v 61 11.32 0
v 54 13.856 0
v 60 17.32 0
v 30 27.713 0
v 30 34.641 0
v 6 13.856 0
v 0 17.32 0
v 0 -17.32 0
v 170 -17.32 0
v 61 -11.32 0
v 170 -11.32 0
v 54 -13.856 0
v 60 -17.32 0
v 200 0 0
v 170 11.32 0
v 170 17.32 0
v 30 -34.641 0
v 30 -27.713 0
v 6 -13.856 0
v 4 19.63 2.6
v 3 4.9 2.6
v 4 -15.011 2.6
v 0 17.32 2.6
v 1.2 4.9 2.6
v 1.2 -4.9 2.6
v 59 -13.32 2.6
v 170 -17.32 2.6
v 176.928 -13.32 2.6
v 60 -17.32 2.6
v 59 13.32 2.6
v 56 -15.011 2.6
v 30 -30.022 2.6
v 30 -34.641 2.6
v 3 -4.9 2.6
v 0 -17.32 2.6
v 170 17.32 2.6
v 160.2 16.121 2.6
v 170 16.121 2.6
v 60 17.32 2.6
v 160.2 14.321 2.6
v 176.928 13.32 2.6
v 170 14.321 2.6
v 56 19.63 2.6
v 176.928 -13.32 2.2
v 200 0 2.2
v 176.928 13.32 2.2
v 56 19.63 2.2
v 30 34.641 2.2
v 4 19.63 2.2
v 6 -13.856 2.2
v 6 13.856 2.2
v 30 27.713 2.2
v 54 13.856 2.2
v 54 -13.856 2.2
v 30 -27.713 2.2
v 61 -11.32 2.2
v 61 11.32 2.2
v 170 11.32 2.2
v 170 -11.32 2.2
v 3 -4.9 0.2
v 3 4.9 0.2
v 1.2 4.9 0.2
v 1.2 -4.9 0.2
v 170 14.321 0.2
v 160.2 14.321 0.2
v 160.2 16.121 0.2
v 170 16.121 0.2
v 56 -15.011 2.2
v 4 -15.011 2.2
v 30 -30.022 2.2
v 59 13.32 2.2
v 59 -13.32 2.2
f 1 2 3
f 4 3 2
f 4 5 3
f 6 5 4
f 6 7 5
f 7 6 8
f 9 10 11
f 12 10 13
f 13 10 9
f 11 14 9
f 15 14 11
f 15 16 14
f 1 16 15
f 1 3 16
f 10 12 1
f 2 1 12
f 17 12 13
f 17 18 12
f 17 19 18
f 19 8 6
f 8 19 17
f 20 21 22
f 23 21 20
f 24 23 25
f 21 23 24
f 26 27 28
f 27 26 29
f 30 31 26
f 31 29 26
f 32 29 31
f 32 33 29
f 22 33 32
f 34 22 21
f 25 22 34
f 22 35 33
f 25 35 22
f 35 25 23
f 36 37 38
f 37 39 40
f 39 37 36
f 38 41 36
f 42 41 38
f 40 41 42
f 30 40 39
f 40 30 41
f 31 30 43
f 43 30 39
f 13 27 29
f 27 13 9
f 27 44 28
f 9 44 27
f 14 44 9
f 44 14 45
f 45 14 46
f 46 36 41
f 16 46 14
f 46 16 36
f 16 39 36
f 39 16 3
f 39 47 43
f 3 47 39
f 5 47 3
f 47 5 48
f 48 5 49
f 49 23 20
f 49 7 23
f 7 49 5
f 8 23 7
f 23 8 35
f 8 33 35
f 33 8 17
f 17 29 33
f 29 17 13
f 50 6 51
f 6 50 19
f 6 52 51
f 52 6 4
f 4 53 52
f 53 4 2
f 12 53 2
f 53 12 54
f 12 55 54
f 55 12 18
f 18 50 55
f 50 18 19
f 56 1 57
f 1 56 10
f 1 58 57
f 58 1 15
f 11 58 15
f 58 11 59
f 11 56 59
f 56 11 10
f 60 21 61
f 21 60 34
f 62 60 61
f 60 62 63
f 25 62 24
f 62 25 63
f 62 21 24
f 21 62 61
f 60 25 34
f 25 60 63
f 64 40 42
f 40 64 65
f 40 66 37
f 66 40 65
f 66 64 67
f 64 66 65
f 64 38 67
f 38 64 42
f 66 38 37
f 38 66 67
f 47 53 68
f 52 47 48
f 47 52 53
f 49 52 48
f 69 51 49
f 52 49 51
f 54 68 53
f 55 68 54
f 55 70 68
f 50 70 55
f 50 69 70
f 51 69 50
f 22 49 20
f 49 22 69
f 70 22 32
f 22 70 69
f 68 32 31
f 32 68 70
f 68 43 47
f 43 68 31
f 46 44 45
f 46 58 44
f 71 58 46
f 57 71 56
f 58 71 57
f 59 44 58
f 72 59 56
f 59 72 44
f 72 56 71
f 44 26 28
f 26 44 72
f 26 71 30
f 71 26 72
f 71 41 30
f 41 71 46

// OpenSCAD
hexdia = 60;
hexside = 6;
labelw = 110;
labelside = 1;

hexin = 2;

thick = 5.2;
slit = 0.8;

magnetsize = [1.8, 9.8, 4.8];

magnetoff = magnetsize.x/2+1.2;

translate([hexdia/2, 0, 0]) {
    hexlabel();

    *translate([-(hexdia/2-magnetoff), 0, thick/2]) magnet();
    //*translate([ (hexdia/2-magnetoff), 0, thick/2]) magnet();
    *translate([ (hexdia/2+labelw+hexside-magnetoff), 0, thick/2]) magnet();
}

module hexlabel()
{
    hxr = hexdia/sqrt(3);
    hxir = (hexdia-hexside*2)/sqrt(3);
    hin = hexside-hexin;
    hxsr = (hexdia-hin*2)/sqrt(3);
    difference() {
        linear_extrude(height=thick/2, convexity=5) difference() {
            polygon(points=concat(
                [for (an=[30:60:360-30]) [cos(an)*hxr, sin(an)*hxr]],
                [[cos(360-30)*hxr+labelw, sin(360-30)*hxr]
                ,[hexdia+labelw, 0]
                ,[cos(30)*hxr+labelw, sin(30)*hxr]],
                [for (an=[30:60:360-30]) [cos(an)*hxir, sin(an)*hxir]],
                [[cos(360-30)*hxr+labelside, sin(360-30)*hxr+hexside]
                ,[cos(360-30)*hxr+labelw, sin(360-30)*hxr+hexside]
                ,[cos(30)*hxr+labelw, sin(30)*hxr-hexside]
                ,[cos(30)*hxr+labelside, sin(30)*hxr-hexside]]
            ), paths=[
                range(0,9),
                range(9,6),
                range(15,4)]);
        }
        translate([-(hexdia/2-magnetoff), 0, thick/2]) magnethole();
        //translate([ (hexdia/2-magnetoff), 0, thick/2]) magnethole();
        //translate([ (hexdia/2+labelw+hexside-magnetoff), 0, thick/2]) magnethole();
        translate([ (hexdia/2+labelw-magnetsize.y/2), sin(30)*hxr-magnetoff, thick/2])
            rotate([0,0,90]) magnethole();
        translate([0, 0, thick/2-slit/2]) linear_extrude(height=slit/2+0.01, convexity=5)
            polygon(concat(
                [for (an=[30:60:150]) [cos(an)*hxsr, sin(an)*hxsr+2*hin]],
                [for (an=[210:60:360-30]) [cos(an)*hxsr, sin(an)*hxsr]]
                ));
        translate([0, 0, thick/2-slit/2]) linear_extrude(height=slit/2+0.01, convexity=5)
            polygon(
                [[cos(360-30)*hxr+labelside-hexin, sin(360-30)*hxr+hin]
                ,[cos(360-30)*hxr+labelw+hexdia, sin(360-30)*hxr+hin]
                ,[cos(30)*hxr+labelw+hexdia, sin(30)*hxr-hin]
                ,[cos(30)*hxr+labelside-hexin, sin(30)*hxr-hin]]
                );
    }
}

function range(f, t) = [for (i = [f:(f+t-1)]) i];

module magnethole()
{
    cube(magnetsize, true);
}

module magnet()
{
    cube(magnetsize, true);
}
